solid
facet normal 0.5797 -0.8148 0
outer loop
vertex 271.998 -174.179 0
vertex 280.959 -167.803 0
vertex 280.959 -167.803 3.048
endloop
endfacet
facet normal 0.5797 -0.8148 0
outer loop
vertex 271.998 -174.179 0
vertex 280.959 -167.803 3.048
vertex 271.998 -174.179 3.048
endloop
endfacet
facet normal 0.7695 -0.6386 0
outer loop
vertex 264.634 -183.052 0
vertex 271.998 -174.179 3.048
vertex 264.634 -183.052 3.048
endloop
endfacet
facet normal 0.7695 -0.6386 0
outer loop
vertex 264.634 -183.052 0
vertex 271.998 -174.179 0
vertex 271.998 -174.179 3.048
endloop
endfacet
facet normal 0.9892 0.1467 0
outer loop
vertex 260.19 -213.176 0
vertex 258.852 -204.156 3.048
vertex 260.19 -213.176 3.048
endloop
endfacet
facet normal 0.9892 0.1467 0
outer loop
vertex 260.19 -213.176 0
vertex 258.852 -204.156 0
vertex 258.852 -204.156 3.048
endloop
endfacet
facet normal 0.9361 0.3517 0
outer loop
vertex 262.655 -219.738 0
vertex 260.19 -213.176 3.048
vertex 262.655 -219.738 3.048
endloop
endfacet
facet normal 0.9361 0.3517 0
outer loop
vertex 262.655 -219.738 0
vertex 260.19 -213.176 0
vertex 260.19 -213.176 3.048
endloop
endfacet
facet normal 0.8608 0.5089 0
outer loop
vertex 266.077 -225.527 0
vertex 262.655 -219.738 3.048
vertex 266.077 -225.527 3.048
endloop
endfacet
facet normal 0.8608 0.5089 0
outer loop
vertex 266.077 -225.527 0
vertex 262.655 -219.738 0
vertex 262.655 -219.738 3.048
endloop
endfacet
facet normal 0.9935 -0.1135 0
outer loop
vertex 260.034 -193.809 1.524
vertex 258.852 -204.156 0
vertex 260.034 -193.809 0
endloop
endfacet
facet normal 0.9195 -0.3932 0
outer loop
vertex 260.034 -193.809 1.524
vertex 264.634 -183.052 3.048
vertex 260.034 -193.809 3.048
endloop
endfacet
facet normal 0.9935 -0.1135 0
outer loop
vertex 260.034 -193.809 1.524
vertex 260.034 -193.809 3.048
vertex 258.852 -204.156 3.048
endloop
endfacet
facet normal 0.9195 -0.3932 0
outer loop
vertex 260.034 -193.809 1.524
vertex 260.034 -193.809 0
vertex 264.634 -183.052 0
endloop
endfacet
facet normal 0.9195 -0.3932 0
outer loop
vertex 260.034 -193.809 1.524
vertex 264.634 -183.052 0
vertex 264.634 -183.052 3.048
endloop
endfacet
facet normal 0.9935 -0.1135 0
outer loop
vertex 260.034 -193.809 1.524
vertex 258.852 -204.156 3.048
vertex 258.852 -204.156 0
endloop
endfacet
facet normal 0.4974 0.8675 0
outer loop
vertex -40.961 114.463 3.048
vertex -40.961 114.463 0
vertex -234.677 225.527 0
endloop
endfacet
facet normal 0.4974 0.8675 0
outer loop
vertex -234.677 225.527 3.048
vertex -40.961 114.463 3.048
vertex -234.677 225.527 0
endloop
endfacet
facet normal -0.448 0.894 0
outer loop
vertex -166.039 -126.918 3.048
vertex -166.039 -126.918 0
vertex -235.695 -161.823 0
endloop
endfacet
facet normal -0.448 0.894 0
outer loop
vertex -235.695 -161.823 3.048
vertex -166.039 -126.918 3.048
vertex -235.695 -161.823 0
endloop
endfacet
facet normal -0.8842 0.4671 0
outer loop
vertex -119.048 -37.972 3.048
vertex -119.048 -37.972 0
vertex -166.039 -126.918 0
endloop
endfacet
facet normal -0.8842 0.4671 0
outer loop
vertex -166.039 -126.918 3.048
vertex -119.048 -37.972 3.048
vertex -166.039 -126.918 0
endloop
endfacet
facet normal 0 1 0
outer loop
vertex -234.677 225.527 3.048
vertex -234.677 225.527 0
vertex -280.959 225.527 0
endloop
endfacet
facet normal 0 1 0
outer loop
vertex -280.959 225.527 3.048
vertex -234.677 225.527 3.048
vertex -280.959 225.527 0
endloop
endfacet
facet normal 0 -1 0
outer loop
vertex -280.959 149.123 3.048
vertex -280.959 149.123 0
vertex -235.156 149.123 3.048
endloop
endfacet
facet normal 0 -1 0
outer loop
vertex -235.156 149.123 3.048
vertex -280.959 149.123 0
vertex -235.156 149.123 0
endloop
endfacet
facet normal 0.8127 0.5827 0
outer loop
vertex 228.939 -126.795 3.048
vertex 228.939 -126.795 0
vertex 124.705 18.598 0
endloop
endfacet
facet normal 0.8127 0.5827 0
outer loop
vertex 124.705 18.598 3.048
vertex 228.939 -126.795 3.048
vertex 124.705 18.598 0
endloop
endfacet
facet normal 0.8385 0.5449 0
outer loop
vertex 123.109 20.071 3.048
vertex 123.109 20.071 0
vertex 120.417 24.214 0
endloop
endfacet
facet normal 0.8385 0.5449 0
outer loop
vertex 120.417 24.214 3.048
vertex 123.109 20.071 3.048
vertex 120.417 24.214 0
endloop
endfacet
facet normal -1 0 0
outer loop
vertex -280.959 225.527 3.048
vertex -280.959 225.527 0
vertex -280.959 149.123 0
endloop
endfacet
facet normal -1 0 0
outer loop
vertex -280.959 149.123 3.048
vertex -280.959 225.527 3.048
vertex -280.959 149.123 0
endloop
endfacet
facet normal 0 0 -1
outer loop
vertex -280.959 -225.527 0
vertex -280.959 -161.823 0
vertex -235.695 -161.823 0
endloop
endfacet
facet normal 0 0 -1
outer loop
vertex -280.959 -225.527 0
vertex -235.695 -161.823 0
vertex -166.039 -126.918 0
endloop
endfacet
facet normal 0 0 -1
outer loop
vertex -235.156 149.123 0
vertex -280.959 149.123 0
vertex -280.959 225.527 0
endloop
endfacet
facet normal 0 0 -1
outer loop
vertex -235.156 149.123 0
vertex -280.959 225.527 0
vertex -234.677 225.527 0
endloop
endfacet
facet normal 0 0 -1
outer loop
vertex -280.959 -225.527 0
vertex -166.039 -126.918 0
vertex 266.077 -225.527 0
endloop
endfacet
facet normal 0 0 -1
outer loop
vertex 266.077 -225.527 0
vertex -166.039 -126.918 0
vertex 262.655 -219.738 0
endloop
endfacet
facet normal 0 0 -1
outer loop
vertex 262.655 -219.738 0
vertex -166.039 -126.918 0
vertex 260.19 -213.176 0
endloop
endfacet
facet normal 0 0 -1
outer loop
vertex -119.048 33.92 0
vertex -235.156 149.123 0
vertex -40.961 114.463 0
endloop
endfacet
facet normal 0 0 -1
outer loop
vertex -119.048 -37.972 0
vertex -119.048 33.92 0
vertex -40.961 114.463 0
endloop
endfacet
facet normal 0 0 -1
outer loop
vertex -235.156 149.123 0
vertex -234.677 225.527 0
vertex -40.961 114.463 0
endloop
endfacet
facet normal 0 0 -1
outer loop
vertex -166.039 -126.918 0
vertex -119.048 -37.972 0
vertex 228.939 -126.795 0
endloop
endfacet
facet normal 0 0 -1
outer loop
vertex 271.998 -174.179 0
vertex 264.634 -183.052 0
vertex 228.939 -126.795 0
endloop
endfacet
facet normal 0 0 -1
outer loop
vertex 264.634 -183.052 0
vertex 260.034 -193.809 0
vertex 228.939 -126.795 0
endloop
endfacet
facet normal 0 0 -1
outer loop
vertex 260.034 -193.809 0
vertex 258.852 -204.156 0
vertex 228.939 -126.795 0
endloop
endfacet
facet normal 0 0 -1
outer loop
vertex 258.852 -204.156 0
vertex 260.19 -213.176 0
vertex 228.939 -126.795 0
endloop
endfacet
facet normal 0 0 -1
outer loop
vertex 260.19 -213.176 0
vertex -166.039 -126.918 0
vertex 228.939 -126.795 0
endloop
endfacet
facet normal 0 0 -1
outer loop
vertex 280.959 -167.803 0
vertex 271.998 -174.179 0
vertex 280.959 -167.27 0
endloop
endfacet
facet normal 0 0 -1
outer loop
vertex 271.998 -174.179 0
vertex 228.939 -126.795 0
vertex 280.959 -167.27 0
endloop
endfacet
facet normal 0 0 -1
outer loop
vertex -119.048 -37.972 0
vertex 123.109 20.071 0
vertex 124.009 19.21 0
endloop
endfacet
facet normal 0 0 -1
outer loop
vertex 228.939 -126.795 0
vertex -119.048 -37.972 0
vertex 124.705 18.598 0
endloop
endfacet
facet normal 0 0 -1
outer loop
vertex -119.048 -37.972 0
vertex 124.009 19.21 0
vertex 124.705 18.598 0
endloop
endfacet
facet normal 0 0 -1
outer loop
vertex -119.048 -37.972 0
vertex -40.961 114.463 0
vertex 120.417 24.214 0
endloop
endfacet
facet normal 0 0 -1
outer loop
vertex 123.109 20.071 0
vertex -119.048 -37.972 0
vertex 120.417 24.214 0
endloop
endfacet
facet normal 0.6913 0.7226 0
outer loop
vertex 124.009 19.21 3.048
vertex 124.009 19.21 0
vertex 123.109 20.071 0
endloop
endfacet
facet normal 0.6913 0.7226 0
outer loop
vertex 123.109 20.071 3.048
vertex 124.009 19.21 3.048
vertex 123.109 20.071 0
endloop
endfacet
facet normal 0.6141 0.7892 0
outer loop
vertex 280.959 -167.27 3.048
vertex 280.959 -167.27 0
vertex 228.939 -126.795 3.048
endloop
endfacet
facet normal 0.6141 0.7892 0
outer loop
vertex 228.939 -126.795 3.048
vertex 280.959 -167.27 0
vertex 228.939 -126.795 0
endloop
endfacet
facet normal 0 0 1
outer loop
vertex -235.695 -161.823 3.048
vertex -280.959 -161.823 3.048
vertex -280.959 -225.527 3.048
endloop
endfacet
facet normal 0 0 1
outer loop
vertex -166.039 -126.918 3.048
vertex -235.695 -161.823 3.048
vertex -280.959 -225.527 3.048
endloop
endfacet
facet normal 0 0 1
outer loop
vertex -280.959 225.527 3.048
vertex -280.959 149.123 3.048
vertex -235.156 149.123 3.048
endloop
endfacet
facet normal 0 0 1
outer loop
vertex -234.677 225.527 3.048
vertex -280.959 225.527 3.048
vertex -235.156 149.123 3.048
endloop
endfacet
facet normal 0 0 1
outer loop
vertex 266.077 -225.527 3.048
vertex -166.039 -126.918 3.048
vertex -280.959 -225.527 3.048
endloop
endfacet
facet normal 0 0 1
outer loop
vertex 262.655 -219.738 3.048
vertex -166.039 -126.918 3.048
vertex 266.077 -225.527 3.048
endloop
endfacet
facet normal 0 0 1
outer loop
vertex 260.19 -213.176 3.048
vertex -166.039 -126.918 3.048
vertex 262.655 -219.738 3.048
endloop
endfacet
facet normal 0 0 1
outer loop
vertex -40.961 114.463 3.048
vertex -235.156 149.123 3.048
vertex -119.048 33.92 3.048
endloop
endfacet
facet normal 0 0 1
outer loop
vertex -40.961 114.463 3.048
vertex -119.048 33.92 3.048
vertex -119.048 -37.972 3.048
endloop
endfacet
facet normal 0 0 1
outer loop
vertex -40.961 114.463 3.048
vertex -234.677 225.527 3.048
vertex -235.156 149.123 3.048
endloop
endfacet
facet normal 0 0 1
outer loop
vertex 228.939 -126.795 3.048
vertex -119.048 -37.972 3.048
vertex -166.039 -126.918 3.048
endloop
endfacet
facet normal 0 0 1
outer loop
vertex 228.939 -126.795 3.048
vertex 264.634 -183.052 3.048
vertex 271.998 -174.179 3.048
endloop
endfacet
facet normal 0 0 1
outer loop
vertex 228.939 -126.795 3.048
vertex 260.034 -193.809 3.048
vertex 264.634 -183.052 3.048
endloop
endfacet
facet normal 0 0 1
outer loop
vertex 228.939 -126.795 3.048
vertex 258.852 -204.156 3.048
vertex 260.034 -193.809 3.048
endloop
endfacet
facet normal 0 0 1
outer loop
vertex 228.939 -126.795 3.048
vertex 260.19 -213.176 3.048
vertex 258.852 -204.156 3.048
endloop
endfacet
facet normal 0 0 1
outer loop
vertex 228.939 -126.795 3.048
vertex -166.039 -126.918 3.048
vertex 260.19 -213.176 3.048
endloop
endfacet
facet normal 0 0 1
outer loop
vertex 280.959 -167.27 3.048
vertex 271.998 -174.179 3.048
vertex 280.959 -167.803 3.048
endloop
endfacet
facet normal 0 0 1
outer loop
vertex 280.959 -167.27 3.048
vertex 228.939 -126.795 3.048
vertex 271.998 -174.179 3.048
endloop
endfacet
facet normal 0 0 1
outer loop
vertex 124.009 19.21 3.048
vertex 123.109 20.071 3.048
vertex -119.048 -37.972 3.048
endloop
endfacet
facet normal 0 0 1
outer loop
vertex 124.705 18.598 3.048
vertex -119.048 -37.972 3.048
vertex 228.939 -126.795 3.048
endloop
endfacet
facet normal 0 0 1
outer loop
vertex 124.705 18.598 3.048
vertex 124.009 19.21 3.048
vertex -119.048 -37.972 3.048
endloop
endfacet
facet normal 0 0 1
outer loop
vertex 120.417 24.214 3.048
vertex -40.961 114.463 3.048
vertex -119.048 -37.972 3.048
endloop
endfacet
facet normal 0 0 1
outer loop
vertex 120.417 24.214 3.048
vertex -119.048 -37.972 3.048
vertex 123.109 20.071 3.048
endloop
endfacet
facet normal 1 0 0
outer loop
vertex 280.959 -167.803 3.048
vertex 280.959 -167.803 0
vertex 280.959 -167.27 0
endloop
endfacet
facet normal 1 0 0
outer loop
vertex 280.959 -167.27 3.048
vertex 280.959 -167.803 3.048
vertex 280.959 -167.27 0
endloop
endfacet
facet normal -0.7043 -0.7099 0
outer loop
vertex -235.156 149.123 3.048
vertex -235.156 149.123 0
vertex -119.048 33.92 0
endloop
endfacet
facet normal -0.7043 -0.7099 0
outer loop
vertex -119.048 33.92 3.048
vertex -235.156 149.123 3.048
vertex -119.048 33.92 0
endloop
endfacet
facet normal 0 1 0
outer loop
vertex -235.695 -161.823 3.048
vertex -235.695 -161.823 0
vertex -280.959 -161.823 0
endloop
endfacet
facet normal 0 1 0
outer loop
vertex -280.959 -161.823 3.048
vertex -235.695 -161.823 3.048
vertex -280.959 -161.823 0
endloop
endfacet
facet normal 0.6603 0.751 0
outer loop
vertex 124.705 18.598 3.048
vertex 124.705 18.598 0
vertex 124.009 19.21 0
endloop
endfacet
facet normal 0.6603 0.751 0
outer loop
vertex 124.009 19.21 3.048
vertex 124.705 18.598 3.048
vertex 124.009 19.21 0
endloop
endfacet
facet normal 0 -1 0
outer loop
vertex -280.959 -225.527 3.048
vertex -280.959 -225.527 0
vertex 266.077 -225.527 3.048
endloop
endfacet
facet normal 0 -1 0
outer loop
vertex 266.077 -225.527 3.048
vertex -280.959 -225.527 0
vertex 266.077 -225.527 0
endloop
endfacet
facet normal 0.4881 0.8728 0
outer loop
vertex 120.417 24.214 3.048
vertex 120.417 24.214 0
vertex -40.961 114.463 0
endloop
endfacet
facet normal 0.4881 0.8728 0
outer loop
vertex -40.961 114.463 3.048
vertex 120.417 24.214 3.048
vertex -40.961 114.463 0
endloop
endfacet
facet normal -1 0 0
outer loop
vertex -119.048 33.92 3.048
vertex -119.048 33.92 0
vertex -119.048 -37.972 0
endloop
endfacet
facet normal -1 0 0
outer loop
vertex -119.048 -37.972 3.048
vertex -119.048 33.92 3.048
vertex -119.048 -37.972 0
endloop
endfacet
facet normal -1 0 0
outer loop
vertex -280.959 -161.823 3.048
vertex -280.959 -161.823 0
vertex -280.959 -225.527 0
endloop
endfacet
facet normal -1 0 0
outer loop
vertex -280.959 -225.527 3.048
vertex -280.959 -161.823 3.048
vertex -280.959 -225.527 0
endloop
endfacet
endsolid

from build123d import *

# Parameters (mm, degrees)
F1_DEPTH = 3.048


# Not quite as in the source:
# - ends of sketch curves that miss each other by under 0.0002 mm in the source are joined


with BuildPart() as f1:
    # F0 (on Top) → F1 (new body)
    with BuildSketch(Plane.XY):
        with BuildLine():
            Line((-234.6769754, 225.5266), (-280.958544, 225.5266))
            Line((-280.958544, 225.5266), (-280.958544, 149.1234))
            Line((-280.958544, 149.1234), (-235.1557146, 149.1234))
            Line((-235.1557146, 149.1234), (-119.0483268, 33.9200236))
            Line((-119.0483268, 33.9200236), (-119.0483268, -37.9720094))
            Line((-119.0483268, -37.9720094), (-166.0391904, -126.9183898))
            Line((-166.0391904, -126.9183898), (-235.6947534, -161.8234))
            Line((-235.6947534, -161.8234), (-280.958544, -161.8234))
            Line((-280.958544, -161.8234), (-280.958544, -225.5266))
            Line((-280.958544, -225.5266), (123.1089232, -225.5266))
            Line((123.1089232, -225.5266), (124.704856, -225.5266))
            Line((124.704856, -225.5266), (266.0774968, -225.5266))
            add(Edge.make_bspline(
                [(280.9585266998, -167.802566879), (240.6588540152, -189.7065906201), (266.0774968, -225.5266)],
                knots=[2.111008, 2.111008, 2.111008, 3.713127, 3.713127, 3.713127], degree=2, weights=[1, 0.6959462797, 1]))
            Line((280.9585266998, -167.802566879), (280.9585186, -167.27043))
            Line((280.9585186, -167.27043), (228.939217, -126.7947426))
            Line((228.939217, -126.7947426), (124.704856, 18.5980324))
            Line((124.704856, 18.5980324), (124.0087182, 19.2098422))
            Line((124.0087182, 19.2098422), (123.1089232, 20.0705212))
            Line((123.1089232, 20.0705212), (120.416701, 24.2140232))
            Line((120.416701, 24.2140232), (-40.9613862, 114.4633728))
            Line((-40.9613862, 114.4633728), (-234.6769754, 225.5266))
        make_face()
    extrude(amount=F1_DEPTH)


solid = f1.part
